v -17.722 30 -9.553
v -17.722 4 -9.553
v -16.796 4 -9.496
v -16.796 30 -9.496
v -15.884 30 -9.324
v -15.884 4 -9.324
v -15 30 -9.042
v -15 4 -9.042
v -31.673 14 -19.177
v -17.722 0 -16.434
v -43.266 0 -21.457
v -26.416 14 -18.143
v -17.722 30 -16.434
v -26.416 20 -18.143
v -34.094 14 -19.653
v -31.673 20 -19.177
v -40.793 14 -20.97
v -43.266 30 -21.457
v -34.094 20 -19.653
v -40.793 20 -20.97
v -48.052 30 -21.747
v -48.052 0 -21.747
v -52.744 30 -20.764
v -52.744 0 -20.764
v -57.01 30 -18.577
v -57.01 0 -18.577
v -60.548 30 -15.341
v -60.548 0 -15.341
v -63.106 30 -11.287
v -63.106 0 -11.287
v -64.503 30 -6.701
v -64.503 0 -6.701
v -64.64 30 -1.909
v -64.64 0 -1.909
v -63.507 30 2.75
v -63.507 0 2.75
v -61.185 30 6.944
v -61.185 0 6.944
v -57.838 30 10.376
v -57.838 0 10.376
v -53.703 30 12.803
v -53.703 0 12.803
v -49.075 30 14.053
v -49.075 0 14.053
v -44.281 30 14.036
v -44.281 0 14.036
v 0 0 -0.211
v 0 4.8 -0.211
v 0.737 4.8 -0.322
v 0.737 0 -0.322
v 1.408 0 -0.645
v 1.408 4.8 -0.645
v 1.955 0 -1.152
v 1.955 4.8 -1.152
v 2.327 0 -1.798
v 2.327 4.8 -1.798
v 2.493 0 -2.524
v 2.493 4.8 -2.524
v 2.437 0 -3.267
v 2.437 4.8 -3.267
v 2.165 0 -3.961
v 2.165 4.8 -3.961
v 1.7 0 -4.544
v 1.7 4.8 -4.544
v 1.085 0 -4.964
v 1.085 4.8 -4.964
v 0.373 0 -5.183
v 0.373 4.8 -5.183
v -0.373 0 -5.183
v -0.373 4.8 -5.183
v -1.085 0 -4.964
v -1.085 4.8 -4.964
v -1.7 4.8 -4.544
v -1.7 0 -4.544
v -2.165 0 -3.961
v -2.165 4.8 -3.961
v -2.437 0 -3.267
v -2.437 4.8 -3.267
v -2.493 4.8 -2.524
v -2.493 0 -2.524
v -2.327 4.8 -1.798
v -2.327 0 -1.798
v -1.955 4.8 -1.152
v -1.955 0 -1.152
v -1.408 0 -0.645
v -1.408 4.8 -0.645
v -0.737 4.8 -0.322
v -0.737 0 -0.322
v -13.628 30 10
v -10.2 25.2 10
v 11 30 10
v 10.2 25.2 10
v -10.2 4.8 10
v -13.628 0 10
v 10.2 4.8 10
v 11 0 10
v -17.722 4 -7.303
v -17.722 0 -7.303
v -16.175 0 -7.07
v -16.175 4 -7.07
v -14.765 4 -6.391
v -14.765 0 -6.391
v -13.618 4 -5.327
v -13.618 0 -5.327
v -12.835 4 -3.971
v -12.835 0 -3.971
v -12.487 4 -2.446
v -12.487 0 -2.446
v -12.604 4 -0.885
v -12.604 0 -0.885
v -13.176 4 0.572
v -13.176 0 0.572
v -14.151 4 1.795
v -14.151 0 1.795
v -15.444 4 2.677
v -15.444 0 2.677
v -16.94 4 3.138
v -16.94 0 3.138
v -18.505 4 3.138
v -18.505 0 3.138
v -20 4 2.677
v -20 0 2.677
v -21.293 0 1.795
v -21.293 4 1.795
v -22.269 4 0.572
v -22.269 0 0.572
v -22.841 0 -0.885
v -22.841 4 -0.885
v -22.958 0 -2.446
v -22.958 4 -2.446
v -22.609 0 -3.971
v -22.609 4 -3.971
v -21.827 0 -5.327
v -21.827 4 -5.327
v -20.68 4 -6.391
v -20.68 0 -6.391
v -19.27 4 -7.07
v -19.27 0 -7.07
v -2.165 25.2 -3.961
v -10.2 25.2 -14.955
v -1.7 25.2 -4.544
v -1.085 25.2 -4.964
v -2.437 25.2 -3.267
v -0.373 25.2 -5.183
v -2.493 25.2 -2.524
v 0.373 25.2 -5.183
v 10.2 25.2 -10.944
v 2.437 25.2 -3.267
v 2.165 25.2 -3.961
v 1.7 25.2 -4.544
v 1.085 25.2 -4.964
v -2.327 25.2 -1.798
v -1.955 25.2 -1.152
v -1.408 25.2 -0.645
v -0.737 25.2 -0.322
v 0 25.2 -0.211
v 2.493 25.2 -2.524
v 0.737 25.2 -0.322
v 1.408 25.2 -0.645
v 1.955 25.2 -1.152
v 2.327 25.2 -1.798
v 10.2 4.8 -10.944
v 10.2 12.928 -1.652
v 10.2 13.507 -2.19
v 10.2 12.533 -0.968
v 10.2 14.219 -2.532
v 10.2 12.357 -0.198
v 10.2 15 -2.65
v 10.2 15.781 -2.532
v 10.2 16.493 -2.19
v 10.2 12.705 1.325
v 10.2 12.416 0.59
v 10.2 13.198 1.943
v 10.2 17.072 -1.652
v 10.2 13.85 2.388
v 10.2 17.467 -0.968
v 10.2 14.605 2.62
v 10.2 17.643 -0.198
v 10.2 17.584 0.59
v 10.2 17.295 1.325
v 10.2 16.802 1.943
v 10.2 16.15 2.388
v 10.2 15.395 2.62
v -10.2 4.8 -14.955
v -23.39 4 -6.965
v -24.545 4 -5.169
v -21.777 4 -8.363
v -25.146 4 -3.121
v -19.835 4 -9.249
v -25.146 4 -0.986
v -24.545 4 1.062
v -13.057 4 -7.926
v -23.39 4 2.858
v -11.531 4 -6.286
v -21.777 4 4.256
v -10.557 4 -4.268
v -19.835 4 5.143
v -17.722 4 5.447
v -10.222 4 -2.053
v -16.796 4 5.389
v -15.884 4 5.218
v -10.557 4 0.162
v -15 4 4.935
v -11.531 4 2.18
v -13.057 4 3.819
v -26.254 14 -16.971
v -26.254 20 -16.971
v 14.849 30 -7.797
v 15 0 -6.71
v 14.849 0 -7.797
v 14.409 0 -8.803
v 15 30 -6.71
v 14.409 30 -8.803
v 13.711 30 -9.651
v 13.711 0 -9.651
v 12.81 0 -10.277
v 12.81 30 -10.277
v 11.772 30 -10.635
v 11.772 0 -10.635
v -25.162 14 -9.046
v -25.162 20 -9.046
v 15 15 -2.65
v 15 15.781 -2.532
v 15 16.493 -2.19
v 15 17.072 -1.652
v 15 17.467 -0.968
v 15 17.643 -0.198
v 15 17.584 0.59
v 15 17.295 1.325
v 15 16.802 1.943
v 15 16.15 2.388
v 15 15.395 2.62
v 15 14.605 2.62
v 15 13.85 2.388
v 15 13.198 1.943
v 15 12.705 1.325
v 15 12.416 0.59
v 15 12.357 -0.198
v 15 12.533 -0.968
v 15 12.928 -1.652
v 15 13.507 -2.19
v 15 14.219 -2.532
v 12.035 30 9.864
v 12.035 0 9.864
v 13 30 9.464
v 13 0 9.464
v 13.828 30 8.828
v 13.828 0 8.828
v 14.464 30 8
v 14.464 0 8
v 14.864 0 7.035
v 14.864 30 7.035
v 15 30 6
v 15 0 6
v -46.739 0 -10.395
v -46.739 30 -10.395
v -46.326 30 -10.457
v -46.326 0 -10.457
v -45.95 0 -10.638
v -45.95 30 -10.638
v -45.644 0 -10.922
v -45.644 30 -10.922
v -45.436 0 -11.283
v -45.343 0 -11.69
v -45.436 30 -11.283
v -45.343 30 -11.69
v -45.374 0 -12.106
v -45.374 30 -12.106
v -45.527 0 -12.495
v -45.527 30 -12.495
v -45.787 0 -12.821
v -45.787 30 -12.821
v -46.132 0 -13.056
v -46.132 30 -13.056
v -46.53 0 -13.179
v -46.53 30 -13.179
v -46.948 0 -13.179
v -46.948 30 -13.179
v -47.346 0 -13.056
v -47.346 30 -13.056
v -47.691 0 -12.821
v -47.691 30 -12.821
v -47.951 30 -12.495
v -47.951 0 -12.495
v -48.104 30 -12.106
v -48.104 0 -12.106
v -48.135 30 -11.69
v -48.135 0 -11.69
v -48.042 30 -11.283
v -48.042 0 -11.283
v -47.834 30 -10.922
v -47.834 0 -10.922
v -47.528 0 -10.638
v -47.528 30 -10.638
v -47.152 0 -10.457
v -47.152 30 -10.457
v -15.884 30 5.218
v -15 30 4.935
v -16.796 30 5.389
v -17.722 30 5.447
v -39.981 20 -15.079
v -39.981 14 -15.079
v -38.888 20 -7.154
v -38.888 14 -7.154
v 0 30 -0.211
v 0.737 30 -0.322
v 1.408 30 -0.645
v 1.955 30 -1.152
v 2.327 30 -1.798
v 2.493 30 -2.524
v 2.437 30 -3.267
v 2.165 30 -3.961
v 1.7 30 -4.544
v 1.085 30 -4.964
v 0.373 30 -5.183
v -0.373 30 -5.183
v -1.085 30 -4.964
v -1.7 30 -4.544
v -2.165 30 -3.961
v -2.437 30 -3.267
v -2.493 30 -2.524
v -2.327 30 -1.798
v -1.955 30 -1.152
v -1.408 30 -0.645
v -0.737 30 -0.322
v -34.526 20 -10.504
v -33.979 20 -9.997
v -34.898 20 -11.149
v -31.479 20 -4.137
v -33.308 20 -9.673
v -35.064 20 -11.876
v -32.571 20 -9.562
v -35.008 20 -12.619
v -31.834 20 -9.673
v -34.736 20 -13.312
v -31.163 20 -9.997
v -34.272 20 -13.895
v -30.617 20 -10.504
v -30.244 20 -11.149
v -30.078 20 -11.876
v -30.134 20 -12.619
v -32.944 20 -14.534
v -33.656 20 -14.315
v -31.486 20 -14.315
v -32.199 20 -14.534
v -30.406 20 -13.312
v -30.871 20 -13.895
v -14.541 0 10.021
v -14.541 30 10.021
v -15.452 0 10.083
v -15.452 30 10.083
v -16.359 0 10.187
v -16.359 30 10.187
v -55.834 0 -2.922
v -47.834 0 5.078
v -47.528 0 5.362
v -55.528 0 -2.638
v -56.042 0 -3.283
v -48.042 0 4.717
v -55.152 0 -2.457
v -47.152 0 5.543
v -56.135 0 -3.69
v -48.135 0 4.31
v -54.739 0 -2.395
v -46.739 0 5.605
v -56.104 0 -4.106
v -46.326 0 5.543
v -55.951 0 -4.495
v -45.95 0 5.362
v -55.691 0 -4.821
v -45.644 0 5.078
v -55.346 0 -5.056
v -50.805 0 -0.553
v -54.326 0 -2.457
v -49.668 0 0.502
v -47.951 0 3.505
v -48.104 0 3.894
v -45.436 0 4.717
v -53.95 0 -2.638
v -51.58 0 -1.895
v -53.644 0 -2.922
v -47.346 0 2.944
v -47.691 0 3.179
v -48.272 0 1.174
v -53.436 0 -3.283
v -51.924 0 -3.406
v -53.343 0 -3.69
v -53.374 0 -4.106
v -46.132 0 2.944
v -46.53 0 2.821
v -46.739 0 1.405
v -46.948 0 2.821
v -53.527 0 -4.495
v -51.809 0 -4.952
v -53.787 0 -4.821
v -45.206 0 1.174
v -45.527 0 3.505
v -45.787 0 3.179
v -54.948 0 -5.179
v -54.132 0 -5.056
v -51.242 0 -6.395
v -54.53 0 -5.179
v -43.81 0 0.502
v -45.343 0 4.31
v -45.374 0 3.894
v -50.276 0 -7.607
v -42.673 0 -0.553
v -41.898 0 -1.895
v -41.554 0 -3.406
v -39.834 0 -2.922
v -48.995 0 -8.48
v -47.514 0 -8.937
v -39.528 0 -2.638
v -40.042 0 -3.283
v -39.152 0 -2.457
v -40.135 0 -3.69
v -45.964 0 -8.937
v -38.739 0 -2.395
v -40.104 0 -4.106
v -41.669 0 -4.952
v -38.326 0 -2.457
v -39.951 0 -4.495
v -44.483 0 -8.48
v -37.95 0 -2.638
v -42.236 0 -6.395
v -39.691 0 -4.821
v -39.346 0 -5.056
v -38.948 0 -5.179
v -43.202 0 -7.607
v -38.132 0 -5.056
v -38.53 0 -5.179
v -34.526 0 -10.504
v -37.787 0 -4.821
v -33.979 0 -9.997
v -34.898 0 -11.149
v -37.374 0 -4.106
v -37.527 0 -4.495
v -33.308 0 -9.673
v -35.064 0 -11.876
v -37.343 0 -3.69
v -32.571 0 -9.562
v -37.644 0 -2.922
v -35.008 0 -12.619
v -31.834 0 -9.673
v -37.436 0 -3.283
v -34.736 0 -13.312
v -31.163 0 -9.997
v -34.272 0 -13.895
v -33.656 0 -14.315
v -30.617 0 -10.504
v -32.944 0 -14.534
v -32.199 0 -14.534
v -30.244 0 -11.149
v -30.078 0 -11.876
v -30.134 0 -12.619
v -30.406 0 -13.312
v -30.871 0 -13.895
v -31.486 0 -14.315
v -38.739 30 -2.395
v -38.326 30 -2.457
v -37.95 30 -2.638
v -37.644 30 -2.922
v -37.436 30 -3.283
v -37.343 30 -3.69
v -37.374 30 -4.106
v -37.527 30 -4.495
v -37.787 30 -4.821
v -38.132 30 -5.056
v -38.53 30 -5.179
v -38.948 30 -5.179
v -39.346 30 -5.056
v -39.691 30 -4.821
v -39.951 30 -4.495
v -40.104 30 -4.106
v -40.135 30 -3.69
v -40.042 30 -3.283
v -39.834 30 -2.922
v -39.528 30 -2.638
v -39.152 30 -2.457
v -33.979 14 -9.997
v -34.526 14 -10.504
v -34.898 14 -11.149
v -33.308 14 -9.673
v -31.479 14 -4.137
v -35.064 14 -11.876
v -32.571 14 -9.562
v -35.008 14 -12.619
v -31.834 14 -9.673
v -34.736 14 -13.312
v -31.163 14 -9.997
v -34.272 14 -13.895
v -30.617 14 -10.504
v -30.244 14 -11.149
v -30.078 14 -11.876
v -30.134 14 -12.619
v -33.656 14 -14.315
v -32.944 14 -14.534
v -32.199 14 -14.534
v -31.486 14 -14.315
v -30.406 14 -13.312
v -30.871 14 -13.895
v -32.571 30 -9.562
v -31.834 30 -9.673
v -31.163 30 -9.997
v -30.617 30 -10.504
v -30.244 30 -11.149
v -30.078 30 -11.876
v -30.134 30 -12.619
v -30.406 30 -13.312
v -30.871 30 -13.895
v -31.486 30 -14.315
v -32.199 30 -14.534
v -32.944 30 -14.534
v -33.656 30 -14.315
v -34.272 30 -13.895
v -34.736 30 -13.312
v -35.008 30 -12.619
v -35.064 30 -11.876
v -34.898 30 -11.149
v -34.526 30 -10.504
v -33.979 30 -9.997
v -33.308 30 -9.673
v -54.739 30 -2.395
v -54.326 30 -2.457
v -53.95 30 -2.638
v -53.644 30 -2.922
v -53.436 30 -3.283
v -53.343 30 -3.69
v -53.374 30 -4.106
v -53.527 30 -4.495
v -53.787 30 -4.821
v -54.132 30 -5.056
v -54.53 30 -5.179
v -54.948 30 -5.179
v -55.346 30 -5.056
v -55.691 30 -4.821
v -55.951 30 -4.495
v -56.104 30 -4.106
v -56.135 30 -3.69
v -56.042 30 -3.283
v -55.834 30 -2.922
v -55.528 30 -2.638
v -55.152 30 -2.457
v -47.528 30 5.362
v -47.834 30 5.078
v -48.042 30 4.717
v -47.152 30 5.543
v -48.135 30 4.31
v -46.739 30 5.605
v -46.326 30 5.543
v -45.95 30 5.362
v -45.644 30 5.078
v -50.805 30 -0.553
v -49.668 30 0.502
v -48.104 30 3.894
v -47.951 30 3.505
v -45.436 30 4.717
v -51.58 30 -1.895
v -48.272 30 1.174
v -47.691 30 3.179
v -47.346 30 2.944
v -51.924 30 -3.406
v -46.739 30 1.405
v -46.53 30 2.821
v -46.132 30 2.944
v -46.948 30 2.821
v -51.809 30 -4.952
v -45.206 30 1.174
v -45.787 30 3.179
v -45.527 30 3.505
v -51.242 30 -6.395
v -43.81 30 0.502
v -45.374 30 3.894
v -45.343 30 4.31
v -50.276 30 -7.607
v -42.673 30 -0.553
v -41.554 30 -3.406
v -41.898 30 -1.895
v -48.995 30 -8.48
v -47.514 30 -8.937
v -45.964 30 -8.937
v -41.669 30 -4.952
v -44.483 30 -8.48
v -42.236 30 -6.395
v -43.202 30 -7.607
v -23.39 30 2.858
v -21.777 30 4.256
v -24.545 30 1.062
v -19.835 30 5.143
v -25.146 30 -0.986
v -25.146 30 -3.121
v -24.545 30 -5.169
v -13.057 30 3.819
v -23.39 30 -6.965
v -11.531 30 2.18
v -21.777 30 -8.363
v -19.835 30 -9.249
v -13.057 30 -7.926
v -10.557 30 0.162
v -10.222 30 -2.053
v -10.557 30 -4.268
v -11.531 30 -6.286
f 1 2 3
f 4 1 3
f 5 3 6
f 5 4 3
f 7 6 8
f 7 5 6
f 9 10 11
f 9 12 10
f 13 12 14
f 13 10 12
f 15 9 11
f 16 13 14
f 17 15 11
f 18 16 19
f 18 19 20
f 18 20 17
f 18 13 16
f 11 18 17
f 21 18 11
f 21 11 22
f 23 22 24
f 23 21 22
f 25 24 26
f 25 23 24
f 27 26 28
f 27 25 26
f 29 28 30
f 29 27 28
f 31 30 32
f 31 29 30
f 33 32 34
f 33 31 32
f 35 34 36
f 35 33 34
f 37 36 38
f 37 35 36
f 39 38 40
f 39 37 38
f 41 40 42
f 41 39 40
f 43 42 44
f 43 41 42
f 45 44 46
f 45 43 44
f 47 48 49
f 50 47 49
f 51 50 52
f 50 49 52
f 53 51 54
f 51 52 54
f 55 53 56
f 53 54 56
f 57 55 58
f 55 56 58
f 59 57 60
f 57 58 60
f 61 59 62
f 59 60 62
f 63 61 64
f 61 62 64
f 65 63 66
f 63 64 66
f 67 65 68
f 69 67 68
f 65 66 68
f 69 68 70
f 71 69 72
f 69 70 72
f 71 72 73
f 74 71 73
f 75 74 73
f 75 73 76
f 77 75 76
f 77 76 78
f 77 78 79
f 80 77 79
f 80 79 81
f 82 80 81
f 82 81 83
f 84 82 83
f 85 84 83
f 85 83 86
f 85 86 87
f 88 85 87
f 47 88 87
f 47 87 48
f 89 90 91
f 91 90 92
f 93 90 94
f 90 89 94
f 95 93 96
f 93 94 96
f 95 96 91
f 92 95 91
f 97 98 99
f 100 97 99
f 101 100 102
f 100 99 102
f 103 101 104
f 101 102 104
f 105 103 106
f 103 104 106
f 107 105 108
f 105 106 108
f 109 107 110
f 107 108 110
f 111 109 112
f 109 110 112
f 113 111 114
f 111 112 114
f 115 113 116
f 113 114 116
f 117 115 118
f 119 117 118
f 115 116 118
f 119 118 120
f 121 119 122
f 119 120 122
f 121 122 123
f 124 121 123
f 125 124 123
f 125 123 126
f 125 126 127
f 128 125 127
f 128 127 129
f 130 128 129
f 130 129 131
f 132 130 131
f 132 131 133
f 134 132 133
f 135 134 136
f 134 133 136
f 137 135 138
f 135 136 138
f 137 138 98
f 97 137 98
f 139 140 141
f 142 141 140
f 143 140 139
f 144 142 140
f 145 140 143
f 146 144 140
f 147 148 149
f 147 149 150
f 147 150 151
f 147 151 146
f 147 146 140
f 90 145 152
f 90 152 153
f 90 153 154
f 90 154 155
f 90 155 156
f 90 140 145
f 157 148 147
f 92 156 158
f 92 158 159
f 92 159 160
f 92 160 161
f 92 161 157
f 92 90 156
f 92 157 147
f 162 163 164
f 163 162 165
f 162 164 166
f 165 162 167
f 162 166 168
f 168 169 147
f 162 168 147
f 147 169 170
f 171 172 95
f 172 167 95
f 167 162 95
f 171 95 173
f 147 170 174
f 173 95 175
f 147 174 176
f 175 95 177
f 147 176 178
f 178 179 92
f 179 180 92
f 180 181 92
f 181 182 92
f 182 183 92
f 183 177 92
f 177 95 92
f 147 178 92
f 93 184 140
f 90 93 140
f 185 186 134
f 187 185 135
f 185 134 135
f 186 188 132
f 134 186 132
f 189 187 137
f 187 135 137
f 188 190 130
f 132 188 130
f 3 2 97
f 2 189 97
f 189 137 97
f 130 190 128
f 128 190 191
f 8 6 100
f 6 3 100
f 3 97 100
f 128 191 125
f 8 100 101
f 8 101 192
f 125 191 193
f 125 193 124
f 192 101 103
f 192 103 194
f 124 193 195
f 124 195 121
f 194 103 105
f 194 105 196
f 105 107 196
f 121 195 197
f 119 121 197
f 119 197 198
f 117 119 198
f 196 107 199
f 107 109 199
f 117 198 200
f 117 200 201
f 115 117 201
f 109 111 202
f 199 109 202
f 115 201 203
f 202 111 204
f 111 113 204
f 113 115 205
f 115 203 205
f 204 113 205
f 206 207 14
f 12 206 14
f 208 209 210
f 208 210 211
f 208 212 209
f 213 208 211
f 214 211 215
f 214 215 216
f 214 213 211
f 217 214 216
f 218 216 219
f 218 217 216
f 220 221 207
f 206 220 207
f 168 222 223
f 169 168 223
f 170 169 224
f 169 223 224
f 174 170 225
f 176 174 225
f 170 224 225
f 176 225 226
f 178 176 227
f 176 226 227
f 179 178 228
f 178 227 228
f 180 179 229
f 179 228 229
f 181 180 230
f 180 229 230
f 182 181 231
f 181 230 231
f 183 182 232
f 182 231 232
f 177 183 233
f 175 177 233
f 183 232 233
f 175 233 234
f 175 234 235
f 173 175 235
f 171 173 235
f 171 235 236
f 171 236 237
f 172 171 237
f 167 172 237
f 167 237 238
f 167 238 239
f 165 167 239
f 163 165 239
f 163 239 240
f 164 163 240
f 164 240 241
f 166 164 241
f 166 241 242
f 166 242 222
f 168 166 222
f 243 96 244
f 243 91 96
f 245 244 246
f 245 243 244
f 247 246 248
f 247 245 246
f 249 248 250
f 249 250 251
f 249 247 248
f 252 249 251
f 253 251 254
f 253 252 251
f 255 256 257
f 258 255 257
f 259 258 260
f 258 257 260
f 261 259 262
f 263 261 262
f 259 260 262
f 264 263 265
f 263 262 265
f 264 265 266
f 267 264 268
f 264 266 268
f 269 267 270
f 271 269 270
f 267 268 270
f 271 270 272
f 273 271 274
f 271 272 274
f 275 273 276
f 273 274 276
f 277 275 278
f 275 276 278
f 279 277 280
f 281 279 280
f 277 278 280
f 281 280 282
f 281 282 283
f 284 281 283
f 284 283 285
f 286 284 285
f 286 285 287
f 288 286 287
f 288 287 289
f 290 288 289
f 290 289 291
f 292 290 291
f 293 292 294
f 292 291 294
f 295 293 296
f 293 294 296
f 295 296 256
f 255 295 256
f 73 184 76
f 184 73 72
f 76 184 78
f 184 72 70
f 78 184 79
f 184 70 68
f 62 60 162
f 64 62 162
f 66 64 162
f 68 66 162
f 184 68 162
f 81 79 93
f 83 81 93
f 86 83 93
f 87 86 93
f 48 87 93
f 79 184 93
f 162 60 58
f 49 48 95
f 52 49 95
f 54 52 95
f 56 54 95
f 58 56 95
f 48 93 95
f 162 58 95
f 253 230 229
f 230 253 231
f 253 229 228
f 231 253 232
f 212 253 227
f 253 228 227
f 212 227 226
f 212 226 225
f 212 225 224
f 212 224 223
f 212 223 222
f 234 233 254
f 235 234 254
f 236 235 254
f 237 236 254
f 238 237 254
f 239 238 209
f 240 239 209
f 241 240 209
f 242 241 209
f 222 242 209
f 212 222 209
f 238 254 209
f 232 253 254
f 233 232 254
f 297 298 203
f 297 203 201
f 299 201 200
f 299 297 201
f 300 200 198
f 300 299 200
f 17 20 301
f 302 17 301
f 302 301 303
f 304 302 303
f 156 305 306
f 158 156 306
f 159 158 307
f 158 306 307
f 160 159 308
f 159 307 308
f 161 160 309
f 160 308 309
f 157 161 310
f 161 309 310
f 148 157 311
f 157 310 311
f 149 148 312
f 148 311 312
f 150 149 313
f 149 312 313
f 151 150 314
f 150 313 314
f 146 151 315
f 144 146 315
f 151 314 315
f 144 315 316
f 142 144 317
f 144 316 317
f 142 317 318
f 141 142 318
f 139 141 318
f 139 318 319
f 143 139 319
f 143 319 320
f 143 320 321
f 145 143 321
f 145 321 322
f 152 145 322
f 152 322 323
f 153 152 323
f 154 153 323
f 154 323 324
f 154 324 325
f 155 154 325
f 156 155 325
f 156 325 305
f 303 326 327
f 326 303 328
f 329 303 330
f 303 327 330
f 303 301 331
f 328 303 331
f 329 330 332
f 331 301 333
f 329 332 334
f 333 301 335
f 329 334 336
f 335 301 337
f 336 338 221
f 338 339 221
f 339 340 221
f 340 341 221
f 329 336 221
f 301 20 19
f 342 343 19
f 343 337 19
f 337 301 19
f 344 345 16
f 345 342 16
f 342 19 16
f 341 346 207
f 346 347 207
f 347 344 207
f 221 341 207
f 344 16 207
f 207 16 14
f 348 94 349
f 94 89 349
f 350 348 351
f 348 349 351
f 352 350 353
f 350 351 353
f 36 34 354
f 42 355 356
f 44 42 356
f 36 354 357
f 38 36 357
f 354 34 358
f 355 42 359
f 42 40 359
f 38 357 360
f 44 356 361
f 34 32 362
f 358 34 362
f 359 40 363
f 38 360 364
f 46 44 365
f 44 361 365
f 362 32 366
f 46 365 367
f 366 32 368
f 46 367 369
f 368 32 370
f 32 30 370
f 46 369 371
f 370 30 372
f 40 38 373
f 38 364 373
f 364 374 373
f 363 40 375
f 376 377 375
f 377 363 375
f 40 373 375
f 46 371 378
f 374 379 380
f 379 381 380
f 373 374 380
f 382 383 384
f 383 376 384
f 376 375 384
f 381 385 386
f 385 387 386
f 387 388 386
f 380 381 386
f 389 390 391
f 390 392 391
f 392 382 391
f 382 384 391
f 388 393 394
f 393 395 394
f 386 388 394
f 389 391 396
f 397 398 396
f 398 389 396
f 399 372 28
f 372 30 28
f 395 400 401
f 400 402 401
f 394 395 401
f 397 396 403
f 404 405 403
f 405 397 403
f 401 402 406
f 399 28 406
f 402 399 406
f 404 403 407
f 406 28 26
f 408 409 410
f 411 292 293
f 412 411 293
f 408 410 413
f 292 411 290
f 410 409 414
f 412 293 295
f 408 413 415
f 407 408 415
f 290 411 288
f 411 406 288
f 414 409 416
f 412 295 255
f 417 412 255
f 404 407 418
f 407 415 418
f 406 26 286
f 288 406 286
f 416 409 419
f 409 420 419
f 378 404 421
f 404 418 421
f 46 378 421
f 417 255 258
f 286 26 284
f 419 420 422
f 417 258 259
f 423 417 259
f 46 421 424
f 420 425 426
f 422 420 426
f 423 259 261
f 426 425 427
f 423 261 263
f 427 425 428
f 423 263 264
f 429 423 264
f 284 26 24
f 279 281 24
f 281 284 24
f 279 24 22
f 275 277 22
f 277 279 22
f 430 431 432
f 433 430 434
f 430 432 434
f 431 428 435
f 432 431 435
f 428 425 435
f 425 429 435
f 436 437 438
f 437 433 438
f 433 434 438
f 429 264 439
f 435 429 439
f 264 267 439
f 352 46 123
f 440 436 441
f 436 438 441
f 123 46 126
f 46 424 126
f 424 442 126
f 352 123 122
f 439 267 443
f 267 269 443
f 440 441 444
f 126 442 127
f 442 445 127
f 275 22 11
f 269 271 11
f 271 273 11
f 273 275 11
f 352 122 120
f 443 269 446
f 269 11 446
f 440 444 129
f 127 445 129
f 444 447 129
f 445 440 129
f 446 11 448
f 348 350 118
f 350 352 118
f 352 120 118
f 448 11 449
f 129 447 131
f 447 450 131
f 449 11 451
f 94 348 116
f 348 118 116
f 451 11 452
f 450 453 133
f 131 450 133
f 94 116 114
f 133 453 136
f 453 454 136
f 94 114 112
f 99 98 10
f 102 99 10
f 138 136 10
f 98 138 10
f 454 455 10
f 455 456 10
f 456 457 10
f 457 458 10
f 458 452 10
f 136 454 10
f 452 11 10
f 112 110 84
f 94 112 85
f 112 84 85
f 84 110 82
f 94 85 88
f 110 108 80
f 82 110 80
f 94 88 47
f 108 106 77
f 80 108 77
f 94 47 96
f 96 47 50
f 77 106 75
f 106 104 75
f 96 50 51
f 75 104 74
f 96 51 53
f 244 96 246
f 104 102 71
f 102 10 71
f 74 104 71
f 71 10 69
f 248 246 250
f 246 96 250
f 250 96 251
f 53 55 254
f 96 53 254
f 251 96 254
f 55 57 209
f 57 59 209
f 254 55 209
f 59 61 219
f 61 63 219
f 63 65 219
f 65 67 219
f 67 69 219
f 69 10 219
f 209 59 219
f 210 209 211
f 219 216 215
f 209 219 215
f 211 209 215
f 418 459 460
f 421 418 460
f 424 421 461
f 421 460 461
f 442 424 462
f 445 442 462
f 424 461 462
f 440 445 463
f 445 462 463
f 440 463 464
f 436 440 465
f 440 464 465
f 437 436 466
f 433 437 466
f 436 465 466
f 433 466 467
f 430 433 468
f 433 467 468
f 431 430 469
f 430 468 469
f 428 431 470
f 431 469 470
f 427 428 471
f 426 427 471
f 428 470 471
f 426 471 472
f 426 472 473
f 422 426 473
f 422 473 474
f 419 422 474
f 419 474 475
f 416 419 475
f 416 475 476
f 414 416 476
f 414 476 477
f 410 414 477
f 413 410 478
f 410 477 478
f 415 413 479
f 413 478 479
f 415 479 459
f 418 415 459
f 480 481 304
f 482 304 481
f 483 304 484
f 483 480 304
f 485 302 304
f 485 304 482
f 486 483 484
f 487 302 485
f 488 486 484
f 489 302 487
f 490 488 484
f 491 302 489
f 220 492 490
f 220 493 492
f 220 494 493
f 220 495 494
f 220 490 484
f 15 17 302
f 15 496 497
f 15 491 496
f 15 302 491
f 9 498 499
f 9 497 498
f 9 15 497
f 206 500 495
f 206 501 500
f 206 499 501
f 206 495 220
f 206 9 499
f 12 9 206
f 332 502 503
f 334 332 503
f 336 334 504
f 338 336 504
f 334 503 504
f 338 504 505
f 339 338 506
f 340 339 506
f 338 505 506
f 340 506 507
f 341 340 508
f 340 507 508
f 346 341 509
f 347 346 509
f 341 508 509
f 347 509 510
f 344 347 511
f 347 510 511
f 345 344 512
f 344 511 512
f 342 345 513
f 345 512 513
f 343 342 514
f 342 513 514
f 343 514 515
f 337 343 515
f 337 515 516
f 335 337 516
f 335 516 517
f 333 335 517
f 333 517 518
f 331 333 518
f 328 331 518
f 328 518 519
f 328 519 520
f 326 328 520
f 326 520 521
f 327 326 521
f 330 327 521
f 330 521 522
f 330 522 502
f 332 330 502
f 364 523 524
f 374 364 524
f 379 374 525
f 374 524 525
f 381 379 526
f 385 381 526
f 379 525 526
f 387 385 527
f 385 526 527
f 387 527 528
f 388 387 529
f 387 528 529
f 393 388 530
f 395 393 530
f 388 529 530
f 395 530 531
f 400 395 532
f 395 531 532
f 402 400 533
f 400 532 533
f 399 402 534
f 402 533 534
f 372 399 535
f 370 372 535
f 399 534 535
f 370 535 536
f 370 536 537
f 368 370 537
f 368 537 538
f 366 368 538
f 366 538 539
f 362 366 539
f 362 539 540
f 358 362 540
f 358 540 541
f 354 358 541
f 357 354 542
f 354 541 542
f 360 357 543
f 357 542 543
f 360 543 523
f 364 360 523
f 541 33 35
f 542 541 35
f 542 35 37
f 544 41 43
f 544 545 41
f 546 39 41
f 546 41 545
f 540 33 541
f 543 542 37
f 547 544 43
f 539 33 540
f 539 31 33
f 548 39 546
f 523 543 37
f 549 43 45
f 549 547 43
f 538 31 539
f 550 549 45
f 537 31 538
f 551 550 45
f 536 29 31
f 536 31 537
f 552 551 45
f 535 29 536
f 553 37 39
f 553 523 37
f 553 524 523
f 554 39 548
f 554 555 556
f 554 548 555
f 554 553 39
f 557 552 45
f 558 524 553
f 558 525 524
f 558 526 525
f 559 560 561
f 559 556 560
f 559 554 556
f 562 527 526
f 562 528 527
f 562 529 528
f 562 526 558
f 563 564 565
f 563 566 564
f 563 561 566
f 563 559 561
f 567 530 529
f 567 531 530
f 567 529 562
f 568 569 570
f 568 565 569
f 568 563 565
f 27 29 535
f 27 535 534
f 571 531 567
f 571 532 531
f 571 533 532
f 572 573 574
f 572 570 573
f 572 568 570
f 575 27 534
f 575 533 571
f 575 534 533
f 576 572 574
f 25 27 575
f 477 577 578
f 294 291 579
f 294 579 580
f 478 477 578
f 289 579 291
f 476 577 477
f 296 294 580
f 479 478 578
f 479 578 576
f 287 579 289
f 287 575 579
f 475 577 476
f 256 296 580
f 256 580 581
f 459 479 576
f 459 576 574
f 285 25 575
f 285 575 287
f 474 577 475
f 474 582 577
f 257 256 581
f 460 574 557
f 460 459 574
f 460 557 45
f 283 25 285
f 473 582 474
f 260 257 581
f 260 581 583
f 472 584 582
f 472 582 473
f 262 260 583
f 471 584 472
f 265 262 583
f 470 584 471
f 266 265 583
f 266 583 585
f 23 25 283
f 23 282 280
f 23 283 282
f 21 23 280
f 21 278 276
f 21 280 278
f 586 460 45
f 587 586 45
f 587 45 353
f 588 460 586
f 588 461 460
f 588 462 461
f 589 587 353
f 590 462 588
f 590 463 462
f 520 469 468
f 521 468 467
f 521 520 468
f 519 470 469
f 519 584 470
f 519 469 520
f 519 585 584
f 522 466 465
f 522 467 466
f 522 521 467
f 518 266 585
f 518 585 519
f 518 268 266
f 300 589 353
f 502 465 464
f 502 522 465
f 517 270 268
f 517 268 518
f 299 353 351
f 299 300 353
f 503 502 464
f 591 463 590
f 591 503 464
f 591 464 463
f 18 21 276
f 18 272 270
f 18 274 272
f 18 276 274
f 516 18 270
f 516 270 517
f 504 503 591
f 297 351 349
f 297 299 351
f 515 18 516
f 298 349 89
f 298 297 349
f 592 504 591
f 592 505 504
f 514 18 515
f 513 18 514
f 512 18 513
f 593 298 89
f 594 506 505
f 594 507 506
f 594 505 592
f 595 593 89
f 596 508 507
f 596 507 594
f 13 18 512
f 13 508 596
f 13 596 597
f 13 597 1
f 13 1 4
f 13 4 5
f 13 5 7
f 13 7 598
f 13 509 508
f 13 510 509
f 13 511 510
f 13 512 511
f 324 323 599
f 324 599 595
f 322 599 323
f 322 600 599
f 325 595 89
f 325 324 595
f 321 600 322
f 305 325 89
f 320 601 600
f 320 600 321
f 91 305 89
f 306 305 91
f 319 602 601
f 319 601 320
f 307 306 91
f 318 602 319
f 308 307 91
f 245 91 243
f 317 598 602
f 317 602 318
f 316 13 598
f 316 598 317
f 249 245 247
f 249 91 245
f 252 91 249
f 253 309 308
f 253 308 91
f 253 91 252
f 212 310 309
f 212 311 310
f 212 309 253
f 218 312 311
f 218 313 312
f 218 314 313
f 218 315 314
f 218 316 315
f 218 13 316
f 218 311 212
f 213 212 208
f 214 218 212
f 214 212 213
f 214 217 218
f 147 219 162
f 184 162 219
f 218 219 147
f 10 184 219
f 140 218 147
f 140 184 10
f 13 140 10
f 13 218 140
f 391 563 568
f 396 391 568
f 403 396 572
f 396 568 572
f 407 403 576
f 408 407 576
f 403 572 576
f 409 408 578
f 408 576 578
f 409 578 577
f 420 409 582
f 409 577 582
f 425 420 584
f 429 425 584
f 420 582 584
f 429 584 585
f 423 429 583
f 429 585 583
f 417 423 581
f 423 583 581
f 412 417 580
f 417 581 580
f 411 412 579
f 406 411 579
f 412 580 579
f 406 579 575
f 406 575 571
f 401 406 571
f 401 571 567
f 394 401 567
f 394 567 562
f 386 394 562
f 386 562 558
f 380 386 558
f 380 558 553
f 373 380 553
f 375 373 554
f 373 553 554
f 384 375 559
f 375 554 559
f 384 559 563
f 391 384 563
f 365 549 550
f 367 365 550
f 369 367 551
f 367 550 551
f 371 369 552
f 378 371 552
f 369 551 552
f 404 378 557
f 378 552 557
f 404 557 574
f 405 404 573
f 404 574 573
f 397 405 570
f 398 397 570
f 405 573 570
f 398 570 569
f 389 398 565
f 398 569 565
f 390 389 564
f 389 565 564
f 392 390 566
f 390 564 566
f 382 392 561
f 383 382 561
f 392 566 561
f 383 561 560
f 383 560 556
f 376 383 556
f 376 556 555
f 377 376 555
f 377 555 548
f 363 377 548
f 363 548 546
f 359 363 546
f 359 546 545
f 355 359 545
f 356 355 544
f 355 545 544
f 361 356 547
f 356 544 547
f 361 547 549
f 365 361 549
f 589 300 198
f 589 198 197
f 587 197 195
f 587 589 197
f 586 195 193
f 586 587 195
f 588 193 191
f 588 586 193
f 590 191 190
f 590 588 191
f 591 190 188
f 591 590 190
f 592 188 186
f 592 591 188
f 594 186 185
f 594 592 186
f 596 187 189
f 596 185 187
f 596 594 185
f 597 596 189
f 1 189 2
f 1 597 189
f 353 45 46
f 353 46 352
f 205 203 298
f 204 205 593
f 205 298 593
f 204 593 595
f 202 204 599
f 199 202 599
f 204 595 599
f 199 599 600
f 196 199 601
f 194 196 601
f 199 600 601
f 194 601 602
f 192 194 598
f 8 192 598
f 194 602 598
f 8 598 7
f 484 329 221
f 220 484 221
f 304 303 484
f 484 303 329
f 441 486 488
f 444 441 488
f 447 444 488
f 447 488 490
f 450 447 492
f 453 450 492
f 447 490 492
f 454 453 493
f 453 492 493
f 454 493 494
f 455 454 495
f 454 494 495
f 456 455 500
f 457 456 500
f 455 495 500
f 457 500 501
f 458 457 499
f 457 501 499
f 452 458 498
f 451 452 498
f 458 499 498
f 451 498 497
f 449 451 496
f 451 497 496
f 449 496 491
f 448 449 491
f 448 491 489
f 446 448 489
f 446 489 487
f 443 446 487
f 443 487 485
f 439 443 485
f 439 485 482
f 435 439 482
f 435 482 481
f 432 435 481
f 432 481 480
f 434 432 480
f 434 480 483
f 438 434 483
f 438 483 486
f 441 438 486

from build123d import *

# Parameters (mm, degrees)
SKETCH1_W           = 30
SKETCH1_H           = 20
BOSS_EXTRUDE1_DEPTH = 30
SKETCH3_R           = 1.4
SKETCH3_R_2         = 5.2
BOSS_EXTRUDE2_DEPTH = 30
SKETCH2_W           = 20.4
SKETCH2_H           = 20.4
CUT_EXTRUDE1_DEPTH  = 79.115650631
SKETCH9_R           = 7.5
CUT_EXTRUDE5_DEPTH  = 75.606681327
SKETCH5_R           = 8.054275222
SKETCH5_R_2         = 5.25
BOSS_EXTRUDE3_DEPTH = 4
SKETCH7_R           = 2.5
CUT_EXTRUDE3_DEPTH  = 75.606681327
CUT_EXTRUDE4_START  = -10
SKETCH8_R           = 2.5
CUT_EXTRUDE4_DEPTH  = 6
FILLET1_R           = 20
SKETCH10_R          = 2.65
CUT_EXTRUDE6_DEPTH  = 16
FILLET2_R           = 4


with BuildPart() as part:
    # Sketch1 → Boss-Extrude1 (new body)
    with BuildSketch(Plane(origin=(0, 0, 0), x_dir=(1, 0, 0), z_dir=(0, 1, 0))):
        Rectangle(SKETCH1_W, SKETCH1_H)
    extrude(amount=BOSS_EXTRUDE1_DEPTH)

    # Sketch3 → Boss-Extrude2 (add)
    # profile 1 of 2: a face of its own
    with BuildSketch(Plane(origin=(0, 30, 0), x_dir=(1, 0, 0), z_dir=(0, 1, 0))):
        with BuildLine():
            Line((-17.722348511, 16.434098612), (-17.722348511, 9.553228991))
            ThreePointArc((-17.722348511, 9.553228991), (-16.337354231, 9.424239155), (-15, 9.041706549))
            Line((-15, 9.041706549), (-15, 10))
            Line((-15, 10), (15, 10))
            Line((15, 10), (-17.722348511, 16.434098612))
        make_face()
    # profile 2 of 2: a face of its own
    with BuildSketch(Plane(origin=(0, 30, 0), x_dir=(1, 0, 0), z_dir=(0, 1, 0))):
        with BuildLine():
            ThreePointArc((-17.722348511, -5.446771009), (-25.222348511, 2.053228991), (-17.722348511, 9.553228991))
            Line((-17.722348511, 9.553228991), (-17.722348511, 16.434098612))
            Line((-17.722348511, 16.434098612), (-43.266218467, 21.456714216))
            ThreePointArc((-43.266218467, 21.456714216), (-64.731658081, 4.309271536), (-44.280895506, -14.036469069))
            Line((-44.280895506, -14.036469069), (-15, -10))
            Line((-15, -10), (-15, -4.935248568))
            ThreePointArc((-15, -4.935248568), (-16.337354231, -5.317781174), (-17.722348511, -5.446771009))
        make_face()
        with Locations(Location((-46.739009009, -4.205101259, 0), (0, 0, 270))):
            Circle(SKETCH3_R, mode=Mode.SUBTRACT)
        with Locations(Location((-54.739009009, 3.794898741, 0), (0, 0, 270))):
            Circle(SKETCH3_R, mode=Mode.SUBTRACT)
        with Locations(Location((-46.739009009, 3.794898741, 0), (0, 0, 270))):
            Circle(SKETCH3_R_2, mode=Mode.SUBTRACT)
        with Locations(Location((-46.739009009, 11.794898741, 0), (0, 0, 270))):
            Circle(SKETCH3_R, mode=Mode.SUBTRACT)
        with Locations(Location((-38.739009009, 3.794898741, 0), (0, 0, 270))):
            Circle(SKETCH3_R, mode=Mode.SUBTRACT)
    extrude(amount=-BOSS_EXTRUDE2_DEPTH)

    # Sketch2 → Cut-Extrude1 (cut, through all)
    with BuildSketch(Plane.XY.offset(10)):
        with Locations((0, 15)):
            Rectangle(SKETCH2_W, SKETCH2_H)
    extrude(amount=-CUT_EXTRUDE1_DEPTH, mode=Mode.SUBTRACT)

    # Sketch9 → Cut-Extrude5 (cut, through all)
    with BuildSketch(Plane(origin=(0, 30, 0), x_dir=(1, 0, 0), z_dir=(0, 1, 0))):
        with Locations(Location((-17.722348511, 2.053228991, 0), (0, 0, 270))):
            Circle(SKETCH9_R)
    extrude(amount=-CUT_EXTRUDE5_DEPTH, mode=Mode.SUBTRACT)

    # Sketch5 → Boss-Extrude3 (add)
    with BuildSketch(Plane.XZ):
        with Locations((-17.722348511, -2.053228991)):
            Circle(SKETCH5_R)
        with Locations(Location((-17.722348511, -2.053228991, 0), (0, 0, 270))):
            Circle(SKETCH5_R_2, mode=Mode.SUBTRACT)
    extrude(amount=-BOSS_EXTRUDE3_DEPTH)

    # Sketch7 → Cut-Extrude3 (cut, through all)
    with BuildSketch(Plane(origin=(0, 30, 0), x_dir=(1, 0, 0), z_dir=(0, 1, 0))):
        with Locations(Location((0, 2.711092918, 0), (0, 0, 270))):
            Circle(SKETCH7_R)
        with Locations(Location((-32.57112446, 12.062397221, 0), (0, 0, 270))):
            Circle(SKETCH7_R)
    extrude(amount=-CUT_EXTRUDE3_DEPTH, mode=Mode.SUBTRACT)

    # Sketch8 → Cut-Extrude4 (cut)
    # profile 1 of 5: a face of its own
    with BuildSketch(Plane(origin=(0, 30, 0), x_dir=(1, 0, 0), z_dir=(0, 1, 0)).offset(CUT_EXTRUDE4_START)):
        Polygon((-31.673466141, 19.177265611), (-34.093809851, 19.653170637), (-39.980668575, 15.078795072), (-38.888173685, 7.153742712), (-31.478629569, 4.13734486), (-25.161580344, 9.045999369), (-26.254075234, 16.971051729), align=None)
        with Locations(Location((-32.57112446, 12.062397221, 0), (0, 0, 270))):
            Circle(SKETCH8_R, mode=Mode.SUBTRACT)
    # profile 2 of 5: a face of its own
    with BuildSketch(Plane(origin=(0, 30, 0), x_dir=(1, 0, 0), z_dir=(0, 1, 0)).offset(CUT_EXTRUDE4_START)):
        Polygon((-34.093809851, 19.653170637), (-33.66361935, 19.987449581), (-31.673466141, 19.177265611), (-26.415693603, 18.143445347), (-27.334766958, 24.810482895), (-41.061360298, 22.918226238), (-40.792843449, 20.970381801), align=None)
    # profile 3 of 5: a face of its own
    with BuildSketch(Plane(origin=(0, 30, 0), x_dir=(1, 0, 0), z_dir=(0, 1, 0)).offset(CUT_EXTRUDE4_START)):
        Polygon((-26.415693603, 18.143445347), (-31.673466141, 19.177265611), (-26.254075234, 16.971051729), align=None)
    # profile 4 of 5: a face of its own
    with BuildSketch(Plane(origin=(0, 30, 0), x_dir=(1, 0, 0), z_dir=(0, 1, 0)).offset(CUT_EXTRUDE4_START)):
        Polygon((-39.980668575, 15.078795072), (-34.093809851, 19.653170637), (-40.792843449, 20.970381801), align=None)
    # profile 5 of 5: a face of its own
    with BuildSketch(Plane(origin=(0, 30, 0), x_dir=(1, 0, 0), z_dir=(0, 1, 0)).offset(CUT_EXTRUDE4_START)):
        Polygon((-31.673466141, 19.177265611), (-33.66361935, 19.987449581), (-34.093809851, 19.653170637), align=None)
    extrude(amount=-CUT_EXTRUDE4_DEPTH, mode=Mode.SUBTRACT)

    # Fillet1
    fillet1_edges = [part.edges().sort_by_distance(p)[0] for p in [
        (-15, 15, 10),
    ]]
    fillet(fillet1_edges, radius=FILLET1_R)

    # Sketch10 → Cut-Extrude6 (cut)
    with BuildSketch(Plane(origin=(15, 0, 0), x_dir=(0, 0, -1), z_dir=(1, 0, 0))):
        with Locations((0, 15)):
            Circle(SKETCH10_R)
    extrude(amount=-CUT_EXTRUDE6_DEPTH, mode=Mode.SUBTRACT)

    # Fillet2
    fillet2_edges = [part.edges().sort_by_distance(p)[0] for p in [
        (15, 15, 10),
        (15, 15, -10),
    ]]
    fillet(fillet2_edges, radius=FILLET2_R)


solid = part.part
